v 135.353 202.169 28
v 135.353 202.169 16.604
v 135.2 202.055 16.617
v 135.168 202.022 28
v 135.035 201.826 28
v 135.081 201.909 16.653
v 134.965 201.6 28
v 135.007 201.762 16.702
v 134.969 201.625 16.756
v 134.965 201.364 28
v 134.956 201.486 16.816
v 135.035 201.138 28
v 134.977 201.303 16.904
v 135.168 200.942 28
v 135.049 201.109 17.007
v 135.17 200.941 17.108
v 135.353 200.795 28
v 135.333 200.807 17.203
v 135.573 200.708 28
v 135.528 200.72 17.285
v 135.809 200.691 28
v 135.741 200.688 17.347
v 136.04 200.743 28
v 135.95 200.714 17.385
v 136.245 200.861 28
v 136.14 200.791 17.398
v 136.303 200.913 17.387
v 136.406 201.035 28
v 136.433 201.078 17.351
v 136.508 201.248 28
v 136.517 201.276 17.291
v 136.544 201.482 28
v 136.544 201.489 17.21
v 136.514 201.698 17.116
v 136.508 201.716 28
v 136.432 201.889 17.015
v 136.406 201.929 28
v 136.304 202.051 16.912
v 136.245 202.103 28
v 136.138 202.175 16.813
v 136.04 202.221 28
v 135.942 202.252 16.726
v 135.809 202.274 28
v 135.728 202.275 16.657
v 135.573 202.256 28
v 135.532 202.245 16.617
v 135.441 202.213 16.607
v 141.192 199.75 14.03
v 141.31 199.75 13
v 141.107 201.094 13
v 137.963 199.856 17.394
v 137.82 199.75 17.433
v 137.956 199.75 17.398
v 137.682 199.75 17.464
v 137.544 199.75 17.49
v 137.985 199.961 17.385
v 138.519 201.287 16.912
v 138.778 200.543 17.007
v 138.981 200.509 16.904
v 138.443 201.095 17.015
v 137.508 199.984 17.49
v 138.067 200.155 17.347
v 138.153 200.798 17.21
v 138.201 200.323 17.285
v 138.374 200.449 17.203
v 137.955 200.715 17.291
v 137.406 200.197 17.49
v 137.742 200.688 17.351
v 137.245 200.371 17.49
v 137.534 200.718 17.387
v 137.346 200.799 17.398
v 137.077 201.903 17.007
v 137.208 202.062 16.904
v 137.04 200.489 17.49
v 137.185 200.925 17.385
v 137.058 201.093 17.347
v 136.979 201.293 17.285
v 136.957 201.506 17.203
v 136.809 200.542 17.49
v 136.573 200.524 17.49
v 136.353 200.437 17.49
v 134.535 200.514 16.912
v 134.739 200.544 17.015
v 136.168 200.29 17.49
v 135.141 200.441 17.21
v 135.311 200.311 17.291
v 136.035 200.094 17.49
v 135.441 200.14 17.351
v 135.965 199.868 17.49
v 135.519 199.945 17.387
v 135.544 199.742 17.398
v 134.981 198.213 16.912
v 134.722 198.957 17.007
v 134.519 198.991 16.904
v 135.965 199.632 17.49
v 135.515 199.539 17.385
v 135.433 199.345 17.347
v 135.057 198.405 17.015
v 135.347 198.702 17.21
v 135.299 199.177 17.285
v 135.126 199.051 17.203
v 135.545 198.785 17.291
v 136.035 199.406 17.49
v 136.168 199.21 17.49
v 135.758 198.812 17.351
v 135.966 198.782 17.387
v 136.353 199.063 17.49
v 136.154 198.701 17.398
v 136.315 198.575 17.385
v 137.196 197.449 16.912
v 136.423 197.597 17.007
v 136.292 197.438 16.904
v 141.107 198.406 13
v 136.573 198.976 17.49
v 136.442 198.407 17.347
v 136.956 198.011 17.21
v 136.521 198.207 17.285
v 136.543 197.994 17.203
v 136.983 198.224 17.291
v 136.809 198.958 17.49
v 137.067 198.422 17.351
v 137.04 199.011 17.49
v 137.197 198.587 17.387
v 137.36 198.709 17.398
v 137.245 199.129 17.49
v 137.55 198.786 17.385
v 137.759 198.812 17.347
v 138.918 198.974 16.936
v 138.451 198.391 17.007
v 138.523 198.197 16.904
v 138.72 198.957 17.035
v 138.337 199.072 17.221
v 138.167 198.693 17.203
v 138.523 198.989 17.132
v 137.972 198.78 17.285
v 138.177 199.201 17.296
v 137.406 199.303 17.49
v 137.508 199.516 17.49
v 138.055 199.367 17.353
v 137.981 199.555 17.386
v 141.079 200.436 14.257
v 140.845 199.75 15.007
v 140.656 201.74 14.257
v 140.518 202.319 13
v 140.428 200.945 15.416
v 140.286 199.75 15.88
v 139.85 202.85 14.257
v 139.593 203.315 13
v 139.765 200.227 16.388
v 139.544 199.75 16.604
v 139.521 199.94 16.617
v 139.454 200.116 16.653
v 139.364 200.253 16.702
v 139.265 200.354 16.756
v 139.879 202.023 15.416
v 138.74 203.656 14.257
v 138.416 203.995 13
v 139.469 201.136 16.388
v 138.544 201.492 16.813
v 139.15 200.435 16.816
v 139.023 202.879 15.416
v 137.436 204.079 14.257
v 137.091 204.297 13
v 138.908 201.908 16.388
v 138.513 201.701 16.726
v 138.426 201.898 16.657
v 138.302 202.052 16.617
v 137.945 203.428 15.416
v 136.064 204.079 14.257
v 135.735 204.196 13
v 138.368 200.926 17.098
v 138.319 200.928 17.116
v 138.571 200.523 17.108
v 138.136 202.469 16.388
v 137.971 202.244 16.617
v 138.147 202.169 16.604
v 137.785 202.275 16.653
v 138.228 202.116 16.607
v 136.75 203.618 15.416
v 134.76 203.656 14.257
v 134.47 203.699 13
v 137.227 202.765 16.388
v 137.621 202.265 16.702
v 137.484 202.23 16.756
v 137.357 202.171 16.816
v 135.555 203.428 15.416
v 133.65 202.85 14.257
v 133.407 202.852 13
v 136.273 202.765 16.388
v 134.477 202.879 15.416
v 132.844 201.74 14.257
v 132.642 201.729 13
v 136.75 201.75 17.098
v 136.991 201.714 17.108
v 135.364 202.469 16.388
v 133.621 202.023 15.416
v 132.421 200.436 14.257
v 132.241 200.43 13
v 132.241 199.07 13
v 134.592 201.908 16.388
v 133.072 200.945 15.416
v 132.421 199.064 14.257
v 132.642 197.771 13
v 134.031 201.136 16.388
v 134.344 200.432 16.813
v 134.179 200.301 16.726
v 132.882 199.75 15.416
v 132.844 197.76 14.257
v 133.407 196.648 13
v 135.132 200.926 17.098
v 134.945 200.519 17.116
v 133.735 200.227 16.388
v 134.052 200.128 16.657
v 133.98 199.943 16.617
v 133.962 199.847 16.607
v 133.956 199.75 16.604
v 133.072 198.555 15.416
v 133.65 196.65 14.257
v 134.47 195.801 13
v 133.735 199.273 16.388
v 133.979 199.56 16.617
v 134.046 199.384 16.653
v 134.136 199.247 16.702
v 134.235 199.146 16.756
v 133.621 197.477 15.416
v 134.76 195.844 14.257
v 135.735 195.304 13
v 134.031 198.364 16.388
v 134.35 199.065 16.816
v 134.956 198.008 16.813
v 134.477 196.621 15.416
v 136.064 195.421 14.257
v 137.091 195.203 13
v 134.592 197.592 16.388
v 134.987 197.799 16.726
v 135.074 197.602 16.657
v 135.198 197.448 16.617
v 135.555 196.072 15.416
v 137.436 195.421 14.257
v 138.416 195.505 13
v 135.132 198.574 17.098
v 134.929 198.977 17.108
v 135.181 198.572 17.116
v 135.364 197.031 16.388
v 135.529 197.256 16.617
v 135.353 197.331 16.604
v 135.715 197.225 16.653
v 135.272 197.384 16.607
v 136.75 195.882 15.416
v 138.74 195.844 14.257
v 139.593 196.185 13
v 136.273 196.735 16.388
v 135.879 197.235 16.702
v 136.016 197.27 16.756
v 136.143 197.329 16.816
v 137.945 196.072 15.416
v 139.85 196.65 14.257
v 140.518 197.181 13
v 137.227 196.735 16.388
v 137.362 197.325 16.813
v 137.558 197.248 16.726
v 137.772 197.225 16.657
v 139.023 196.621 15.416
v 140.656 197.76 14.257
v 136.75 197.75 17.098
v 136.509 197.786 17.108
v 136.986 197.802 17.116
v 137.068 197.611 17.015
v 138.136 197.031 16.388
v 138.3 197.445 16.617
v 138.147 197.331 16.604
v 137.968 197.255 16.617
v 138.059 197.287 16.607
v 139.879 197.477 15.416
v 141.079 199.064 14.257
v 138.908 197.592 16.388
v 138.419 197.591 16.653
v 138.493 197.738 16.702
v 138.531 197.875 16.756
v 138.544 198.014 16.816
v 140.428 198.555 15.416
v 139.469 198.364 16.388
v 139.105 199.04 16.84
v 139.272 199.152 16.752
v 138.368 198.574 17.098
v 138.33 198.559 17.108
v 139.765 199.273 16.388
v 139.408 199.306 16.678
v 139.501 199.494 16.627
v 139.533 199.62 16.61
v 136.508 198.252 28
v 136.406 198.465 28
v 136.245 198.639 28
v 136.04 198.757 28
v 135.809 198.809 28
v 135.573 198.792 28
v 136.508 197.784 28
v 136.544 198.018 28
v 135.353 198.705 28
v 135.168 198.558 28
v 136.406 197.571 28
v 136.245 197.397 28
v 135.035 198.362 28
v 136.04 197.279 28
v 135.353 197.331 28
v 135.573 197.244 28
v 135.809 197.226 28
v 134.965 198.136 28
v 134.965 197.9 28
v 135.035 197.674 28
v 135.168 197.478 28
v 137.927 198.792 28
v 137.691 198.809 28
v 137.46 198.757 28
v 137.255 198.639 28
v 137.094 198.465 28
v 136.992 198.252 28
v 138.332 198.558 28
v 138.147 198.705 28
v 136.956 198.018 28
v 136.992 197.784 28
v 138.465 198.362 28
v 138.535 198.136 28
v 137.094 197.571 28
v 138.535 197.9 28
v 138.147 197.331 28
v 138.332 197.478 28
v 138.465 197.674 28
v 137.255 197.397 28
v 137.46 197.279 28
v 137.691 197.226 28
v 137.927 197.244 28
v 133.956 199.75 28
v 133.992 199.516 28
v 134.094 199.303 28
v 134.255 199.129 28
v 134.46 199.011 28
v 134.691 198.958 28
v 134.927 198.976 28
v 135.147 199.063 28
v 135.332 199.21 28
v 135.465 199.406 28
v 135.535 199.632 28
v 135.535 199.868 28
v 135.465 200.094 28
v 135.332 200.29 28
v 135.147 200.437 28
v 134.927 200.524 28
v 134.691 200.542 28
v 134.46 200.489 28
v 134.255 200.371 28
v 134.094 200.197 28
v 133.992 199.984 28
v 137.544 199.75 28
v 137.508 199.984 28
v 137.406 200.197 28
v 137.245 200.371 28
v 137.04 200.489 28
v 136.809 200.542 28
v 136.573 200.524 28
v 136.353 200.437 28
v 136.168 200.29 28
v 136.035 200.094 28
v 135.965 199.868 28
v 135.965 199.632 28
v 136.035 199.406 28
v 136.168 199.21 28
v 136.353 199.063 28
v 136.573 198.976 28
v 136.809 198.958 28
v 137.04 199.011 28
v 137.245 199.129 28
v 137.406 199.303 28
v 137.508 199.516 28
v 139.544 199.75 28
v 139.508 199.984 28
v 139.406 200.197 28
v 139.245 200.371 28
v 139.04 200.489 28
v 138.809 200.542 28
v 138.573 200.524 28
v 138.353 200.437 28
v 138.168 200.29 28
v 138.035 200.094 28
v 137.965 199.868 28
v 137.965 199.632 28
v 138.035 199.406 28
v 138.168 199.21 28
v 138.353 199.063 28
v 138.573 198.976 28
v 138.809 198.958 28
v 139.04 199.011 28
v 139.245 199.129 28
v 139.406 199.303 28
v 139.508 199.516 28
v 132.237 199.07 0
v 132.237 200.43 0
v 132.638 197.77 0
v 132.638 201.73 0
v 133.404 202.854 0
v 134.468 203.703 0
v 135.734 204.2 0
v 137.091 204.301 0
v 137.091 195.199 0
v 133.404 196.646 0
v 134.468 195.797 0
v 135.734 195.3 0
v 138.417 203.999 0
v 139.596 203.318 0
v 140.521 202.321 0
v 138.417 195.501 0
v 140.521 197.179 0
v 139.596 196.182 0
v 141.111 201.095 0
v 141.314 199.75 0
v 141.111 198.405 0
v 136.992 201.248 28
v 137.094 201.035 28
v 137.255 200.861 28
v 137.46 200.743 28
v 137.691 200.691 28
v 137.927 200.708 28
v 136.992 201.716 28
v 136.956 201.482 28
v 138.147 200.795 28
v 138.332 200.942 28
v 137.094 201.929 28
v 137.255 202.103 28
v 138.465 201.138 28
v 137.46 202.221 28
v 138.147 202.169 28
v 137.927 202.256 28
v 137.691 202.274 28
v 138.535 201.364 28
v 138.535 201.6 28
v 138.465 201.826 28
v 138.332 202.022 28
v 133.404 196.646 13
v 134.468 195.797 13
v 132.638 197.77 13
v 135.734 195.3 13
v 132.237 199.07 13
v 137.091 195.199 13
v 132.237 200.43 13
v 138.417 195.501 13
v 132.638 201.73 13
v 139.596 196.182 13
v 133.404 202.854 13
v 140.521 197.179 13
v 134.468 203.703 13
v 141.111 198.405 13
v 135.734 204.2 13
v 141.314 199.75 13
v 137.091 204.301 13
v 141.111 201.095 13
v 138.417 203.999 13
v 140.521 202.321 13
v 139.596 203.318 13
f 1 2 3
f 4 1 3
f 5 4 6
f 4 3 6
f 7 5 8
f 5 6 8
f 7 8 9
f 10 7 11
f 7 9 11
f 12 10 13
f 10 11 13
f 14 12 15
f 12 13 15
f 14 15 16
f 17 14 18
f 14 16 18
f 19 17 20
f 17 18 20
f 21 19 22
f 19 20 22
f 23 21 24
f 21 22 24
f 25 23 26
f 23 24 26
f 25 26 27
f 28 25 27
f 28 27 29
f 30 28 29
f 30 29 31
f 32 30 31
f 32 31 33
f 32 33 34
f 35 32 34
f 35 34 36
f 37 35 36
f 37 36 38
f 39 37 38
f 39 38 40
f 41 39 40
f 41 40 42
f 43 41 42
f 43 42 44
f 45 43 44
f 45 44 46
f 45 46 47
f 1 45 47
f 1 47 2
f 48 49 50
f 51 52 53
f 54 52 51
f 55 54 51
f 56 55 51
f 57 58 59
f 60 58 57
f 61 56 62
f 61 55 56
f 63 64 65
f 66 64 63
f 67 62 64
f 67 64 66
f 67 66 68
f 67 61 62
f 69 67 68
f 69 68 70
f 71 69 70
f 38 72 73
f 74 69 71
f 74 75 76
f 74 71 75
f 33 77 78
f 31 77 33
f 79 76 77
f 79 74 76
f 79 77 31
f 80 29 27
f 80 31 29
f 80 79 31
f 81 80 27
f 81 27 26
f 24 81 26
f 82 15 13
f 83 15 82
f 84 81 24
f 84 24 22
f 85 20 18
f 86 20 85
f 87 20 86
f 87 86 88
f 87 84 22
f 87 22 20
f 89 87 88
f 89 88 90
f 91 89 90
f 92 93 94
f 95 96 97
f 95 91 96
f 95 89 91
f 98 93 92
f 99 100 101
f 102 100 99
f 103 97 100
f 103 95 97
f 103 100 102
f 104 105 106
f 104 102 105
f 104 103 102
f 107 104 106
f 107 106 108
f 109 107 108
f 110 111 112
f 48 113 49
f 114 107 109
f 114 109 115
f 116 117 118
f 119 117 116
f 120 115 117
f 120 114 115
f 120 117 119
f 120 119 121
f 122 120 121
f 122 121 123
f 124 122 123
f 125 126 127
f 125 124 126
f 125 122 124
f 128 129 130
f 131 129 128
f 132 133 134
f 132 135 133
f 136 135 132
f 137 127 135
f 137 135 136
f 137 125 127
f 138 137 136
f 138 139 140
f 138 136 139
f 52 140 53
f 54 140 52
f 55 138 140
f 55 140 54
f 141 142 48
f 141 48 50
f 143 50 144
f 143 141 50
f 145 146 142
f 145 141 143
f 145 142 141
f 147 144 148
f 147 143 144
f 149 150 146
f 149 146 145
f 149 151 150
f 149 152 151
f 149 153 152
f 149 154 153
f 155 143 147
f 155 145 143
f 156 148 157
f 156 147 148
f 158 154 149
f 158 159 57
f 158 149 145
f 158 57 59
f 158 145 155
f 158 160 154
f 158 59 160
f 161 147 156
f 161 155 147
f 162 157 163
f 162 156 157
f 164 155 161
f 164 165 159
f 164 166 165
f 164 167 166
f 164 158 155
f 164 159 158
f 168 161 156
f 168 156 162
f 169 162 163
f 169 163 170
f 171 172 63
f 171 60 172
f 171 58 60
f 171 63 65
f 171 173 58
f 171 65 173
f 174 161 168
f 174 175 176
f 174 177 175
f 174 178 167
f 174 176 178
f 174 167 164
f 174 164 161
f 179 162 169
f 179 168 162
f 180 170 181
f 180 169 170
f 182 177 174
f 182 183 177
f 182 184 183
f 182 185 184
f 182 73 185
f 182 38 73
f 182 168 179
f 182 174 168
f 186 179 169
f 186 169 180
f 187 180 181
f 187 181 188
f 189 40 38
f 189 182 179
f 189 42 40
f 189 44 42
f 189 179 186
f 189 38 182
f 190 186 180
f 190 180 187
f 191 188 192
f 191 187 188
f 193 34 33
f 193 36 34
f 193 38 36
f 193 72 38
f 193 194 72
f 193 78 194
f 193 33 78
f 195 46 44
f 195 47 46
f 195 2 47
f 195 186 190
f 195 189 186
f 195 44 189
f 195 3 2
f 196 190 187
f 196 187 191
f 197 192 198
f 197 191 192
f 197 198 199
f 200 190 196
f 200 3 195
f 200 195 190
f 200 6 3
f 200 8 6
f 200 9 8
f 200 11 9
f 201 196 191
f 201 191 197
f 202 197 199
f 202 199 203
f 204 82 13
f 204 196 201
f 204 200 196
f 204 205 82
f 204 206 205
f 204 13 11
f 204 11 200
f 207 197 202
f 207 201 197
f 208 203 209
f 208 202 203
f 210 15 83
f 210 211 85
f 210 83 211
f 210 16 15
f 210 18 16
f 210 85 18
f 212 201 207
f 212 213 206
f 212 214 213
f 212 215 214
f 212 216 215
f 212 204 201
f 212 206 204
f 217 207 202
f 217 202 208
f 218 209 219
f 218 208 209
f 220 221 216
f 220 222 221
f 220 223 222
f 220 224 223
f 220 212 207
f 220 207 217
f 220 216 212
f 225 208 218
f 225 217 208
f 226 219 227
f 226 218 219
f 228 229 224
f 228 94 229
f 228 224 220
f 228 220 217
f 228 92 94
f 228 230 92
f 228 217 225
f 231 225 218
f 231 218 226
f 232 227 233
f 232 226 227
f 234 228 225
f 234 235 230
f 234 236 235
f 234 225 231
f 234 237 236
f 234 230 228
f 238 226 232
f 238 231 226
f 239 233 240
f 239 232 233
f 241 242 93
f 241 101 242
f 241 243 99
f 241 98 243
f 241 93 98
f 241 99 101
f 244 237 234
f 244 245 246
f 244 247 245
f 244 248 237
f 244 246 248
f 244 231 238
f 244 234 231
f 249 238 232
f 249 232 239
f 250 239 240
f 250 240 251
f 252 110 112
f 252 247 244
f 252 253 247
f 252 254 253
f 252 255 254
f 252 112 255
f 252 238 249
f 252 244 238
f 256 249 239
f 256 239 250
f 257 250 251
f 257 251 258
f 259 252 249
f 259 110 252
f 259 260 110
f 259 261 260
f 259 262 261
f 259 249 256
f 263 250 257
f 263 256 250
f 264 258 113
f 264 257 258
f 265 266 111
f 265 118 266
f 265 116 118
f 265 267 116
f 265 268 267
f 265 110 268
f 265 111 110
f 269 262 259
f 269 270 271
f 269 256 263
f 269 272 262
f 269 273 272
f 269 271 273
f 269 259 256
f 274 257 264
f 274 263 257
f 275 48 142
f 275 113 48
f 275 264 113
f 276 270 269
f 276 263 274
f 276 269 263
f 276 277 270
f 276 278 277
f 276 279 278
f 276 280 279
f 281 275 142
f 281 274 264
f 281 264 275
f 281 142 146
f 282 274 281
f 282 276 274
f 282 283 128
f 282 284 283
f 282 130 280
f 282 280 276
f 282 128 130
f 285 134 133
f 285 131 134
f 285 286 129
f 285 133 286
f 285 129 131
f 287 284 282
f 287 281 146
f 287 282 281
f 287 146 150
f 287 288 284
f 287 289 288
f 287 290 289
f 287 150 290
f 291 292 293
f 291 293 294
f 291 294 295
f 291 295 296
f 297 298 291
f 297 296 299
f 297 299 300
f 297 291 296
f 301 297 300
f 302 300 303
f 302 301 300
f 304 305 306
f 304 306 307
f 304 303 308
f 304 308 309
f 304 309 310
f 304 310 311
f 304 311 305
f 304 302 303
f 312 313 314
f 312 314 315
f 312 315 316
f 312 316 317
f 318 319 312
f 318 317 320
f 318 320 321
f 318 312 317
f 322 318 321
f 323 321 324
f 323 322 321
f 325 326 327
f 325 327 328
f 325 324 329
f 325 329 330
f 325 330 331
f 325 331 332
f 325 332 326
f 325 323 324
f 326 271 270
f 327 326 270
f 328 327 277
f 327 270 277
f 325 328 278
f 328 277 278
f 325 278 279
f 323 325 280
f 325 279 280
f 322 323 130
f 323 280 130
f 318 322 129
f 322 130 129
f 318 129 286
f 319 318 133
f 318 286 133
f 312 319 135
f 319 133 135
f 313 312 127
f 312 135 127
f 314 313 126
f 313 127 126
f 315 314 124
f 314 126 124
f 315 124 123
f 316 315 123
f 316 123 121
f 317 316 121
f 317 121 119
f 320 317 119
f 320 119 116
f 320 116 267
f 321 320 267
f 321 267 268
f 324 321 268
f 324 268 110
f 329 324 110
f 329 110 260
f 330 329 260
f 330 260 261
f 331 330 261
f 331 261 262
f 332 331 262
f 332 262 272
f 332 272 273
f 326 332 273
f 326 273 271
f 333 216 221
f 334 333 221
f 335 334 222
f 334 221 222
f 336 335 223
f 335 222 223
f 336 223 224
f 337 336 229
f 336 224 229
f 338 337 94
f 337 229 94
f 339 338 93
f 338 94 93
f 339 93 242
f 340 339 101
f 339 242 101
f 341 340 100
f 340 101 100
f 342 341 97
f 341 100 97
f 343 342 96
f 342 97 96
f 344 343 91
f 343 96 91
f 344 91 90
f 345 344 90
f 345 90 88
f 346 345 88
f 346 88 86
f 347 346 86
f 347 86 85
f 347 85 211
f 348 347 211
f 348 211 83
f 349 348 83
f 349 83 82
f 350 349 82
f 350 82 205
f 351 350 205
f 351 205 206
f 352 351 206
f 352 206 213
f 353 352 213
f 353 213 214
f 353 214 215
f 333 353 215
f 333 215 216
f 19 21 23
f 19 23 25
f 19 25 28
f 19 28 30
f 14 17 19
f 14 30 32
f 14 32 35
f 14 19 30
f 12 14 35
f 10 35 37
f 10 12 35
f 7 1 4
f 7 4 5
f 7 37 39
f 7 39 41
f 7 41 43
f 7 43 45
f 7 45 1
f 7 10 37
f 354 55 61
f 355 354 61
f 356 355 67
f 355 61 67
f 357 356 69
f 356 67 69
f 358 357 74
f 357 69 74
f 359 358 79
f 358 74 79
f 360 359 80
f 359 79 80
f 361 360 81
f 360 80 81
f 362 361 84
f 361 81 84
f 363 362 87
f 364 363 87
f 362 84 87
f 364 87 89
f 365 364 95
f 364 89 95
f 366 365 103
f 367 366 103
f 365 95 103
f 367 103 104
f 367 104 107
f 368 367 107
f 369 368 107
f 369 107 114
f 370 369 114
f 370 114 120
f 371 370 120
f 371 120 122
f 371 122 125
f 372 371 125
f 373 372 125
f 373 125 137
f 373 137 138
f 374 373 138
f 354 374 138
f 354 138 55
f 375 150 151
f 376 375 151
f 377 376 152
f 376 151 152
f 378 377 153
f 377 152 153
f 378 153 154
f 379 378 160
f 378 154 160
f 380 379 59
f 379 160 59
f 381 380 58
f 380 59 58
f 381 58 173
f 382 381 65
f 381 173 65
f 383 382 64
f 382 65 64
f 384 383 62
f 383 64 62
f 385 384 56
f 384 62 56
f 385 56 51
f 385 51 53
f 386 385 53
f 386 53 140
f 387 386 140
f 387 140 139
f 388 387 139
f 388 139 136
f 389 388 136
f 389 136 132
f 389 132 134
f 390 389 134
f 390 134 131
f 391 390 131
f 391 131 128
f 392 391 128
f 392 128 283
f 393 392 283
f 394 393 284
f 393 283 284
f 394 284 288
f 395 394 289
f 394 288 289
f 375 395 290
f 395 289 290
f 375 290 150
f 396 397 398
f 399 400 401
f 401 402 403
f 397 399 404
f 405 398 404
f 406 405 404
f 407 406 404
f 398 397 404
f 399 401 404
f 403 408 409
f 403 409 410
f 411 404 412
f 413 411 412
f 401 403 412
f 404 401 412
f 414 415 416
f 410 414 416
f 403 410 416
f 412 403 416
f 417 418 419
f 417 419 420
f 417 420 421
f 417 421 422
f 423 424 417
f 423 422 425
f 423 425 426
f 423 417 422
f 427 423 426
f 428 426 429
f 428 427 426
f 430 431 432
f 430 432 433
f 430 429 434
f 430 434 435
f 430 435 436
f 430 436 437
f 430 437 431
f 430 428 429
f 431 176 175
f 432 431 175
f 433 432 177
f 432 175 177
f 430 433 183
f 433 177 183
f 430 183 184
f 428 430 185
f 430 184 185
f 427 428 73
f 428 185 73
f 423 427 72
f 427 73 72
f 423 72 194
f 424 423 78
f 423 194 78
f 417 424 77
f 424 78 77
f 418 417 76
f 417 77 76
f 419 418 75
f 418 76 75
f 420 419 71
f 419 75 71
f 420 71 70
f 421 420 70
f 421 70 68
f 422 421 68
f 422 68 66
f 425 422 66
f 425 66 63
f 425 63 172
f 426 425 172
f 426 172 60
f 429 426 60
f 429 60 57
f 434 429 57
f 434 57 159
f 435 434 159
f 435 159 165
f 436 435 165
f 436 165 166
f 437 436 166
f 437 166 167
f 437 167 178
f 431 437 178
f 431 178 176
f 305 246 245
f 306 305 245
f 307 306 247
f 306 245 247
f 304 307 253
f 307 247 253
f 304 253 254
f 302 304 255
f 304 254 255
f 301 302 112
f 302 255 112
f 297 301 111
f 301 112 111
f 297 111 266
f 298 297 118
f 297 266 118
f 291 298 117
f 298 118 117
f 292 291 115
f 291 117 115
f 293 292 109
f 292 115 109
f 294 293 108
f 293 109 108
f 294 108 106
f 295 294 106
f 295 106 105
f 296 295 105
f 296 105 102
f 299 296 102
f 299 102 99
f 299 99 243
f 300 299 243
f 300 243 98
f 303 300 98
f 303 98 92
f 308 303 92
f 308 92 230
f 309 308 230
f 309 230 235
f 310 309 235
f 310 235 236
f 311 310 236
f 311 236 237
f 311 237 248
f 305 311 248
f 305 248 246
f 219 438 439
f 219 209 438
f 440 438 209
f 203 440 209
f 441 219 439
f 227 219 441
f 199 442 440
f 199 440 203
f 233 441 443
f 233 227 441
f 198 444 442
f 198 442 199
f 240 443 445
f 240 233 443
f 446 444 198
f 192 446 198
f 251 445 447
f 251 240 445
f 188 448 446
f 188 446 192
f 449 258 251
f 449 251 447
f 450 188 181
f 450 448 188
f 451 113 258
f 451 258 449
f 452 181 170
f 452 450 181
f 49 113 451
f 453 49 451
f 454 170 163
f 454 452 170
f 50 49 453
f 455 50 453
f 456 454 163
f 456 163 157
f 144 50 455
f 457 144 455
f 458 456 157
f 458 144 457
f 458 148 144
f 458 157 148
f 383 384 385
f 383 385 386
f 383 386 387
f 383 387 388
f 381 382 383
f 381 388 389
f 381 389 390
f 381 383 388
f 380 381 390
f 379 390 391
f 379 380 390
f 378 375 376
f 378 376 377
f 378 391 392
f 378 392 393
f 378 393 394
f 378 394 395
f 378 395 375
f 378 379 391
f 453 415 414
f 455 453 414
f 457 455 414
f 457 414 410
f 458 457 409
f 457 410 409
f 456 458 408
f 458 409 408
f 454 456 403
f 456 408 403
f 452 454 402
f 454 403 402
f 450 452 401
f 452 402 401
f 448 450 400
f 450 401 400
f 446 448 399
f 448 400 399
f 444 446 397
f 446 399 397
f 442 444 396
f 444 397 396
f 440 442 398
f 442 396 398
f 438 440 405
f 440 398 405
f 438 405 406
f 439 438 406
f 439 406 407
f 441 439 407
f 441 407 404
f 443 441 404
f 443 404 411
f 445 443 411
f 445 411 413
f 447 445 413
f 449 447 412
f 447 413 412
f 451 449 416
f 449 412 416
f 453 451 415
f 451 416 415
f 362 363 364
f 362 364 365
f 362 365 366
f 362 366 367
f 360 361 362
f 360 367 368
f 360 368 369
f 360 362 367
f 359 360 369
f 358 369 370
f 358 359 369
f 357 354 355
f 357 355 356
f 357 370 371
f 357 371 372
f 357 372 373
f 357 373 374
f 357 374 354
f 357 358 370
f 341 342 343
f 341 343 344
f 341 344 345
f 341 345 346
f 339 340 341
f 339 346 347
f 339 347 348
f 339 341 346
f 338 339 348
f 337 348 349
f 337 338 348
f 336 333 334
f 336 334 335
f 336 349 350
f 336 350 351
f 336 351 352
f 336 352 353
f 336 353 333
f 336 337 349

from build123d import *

# Parameters (mm, degrees)
CYLINDER062_R     = 0.79375
CYLINDER062_DEPTH = 28
ARRAY003_COUNT    = 6
CYLINDER063_R     = 0.79375
CYLINDER063_DEPTH = 28
CYLINDER061_R     = 4.564063
CYLINDER061_DEPTH = 13


with BuildPart() as array003:
    # Cylinder062 → Cylinder062 (new body)
    with BuildSketch(Plane(origin=(2, 0, 0), x_dir=(1, 0, 0), z_dir=(0, 0, 1))):
        Circle(CYLINDER062_R)
    extrude(amount=CYLINDER062_DEPTH)

    # Array003: Array003 ×6 about axis
    array003_axis = Axis((0, 0, 0), (0, 0, 1))


with BuildPart() as array003_1:
    add(array003.part)
    for i in range(1, ARRAY003_COUNT):
        add(array003.part.rotate(array003_axis, i * 360 / ARRAY003_COUNT))


with BuildPart() as wireft_holes002:
    # Cylinder063 → Cylinder063 (new body)
    with BuildSketch(Plane.XY):
        Circle(CYLINDER063_R)
    extrude(amount=CYLINDER063_DEPTH)

    # Fusion026: union Array003
    add(array003_1.part)


with BuildPart() as compression002:
    # Sphere002 → Sphere002 (revolve)
    with BuildSketch(Plane(origin=(0, 0, 13), x_dir=(1, 0, 0), z_dir=(0, -1, 0))):
        with BuildLine():
            ThreePointArc((0, -4.56), (4.56, 0), (0, 4.56))
            Line((0, 4.56), (0, -4.56))
        make_face()
    revolve(axis=Axis((0, 0, 13), (0, 0, 1)))


with BuildPart() as wireft006:
    # Cylinder061 → Cylinder061 (new body)
    with BuildSketch(Plane.XY):
        Circle(CYLINDER061_R)
    extrude(amount=CYLINDER061_DEPTH)

    # Fusion027: union WireFT_Holes002, Compression002
    add(wireft_holes002.part)
    add(compression002.part)


with BuildPart() as wireft006_1:
    # Fusion027 placement: moved
    add(wireft006.part.moved(Location((136.75, 199.75, 0))))


solid = wireft006_1.part
